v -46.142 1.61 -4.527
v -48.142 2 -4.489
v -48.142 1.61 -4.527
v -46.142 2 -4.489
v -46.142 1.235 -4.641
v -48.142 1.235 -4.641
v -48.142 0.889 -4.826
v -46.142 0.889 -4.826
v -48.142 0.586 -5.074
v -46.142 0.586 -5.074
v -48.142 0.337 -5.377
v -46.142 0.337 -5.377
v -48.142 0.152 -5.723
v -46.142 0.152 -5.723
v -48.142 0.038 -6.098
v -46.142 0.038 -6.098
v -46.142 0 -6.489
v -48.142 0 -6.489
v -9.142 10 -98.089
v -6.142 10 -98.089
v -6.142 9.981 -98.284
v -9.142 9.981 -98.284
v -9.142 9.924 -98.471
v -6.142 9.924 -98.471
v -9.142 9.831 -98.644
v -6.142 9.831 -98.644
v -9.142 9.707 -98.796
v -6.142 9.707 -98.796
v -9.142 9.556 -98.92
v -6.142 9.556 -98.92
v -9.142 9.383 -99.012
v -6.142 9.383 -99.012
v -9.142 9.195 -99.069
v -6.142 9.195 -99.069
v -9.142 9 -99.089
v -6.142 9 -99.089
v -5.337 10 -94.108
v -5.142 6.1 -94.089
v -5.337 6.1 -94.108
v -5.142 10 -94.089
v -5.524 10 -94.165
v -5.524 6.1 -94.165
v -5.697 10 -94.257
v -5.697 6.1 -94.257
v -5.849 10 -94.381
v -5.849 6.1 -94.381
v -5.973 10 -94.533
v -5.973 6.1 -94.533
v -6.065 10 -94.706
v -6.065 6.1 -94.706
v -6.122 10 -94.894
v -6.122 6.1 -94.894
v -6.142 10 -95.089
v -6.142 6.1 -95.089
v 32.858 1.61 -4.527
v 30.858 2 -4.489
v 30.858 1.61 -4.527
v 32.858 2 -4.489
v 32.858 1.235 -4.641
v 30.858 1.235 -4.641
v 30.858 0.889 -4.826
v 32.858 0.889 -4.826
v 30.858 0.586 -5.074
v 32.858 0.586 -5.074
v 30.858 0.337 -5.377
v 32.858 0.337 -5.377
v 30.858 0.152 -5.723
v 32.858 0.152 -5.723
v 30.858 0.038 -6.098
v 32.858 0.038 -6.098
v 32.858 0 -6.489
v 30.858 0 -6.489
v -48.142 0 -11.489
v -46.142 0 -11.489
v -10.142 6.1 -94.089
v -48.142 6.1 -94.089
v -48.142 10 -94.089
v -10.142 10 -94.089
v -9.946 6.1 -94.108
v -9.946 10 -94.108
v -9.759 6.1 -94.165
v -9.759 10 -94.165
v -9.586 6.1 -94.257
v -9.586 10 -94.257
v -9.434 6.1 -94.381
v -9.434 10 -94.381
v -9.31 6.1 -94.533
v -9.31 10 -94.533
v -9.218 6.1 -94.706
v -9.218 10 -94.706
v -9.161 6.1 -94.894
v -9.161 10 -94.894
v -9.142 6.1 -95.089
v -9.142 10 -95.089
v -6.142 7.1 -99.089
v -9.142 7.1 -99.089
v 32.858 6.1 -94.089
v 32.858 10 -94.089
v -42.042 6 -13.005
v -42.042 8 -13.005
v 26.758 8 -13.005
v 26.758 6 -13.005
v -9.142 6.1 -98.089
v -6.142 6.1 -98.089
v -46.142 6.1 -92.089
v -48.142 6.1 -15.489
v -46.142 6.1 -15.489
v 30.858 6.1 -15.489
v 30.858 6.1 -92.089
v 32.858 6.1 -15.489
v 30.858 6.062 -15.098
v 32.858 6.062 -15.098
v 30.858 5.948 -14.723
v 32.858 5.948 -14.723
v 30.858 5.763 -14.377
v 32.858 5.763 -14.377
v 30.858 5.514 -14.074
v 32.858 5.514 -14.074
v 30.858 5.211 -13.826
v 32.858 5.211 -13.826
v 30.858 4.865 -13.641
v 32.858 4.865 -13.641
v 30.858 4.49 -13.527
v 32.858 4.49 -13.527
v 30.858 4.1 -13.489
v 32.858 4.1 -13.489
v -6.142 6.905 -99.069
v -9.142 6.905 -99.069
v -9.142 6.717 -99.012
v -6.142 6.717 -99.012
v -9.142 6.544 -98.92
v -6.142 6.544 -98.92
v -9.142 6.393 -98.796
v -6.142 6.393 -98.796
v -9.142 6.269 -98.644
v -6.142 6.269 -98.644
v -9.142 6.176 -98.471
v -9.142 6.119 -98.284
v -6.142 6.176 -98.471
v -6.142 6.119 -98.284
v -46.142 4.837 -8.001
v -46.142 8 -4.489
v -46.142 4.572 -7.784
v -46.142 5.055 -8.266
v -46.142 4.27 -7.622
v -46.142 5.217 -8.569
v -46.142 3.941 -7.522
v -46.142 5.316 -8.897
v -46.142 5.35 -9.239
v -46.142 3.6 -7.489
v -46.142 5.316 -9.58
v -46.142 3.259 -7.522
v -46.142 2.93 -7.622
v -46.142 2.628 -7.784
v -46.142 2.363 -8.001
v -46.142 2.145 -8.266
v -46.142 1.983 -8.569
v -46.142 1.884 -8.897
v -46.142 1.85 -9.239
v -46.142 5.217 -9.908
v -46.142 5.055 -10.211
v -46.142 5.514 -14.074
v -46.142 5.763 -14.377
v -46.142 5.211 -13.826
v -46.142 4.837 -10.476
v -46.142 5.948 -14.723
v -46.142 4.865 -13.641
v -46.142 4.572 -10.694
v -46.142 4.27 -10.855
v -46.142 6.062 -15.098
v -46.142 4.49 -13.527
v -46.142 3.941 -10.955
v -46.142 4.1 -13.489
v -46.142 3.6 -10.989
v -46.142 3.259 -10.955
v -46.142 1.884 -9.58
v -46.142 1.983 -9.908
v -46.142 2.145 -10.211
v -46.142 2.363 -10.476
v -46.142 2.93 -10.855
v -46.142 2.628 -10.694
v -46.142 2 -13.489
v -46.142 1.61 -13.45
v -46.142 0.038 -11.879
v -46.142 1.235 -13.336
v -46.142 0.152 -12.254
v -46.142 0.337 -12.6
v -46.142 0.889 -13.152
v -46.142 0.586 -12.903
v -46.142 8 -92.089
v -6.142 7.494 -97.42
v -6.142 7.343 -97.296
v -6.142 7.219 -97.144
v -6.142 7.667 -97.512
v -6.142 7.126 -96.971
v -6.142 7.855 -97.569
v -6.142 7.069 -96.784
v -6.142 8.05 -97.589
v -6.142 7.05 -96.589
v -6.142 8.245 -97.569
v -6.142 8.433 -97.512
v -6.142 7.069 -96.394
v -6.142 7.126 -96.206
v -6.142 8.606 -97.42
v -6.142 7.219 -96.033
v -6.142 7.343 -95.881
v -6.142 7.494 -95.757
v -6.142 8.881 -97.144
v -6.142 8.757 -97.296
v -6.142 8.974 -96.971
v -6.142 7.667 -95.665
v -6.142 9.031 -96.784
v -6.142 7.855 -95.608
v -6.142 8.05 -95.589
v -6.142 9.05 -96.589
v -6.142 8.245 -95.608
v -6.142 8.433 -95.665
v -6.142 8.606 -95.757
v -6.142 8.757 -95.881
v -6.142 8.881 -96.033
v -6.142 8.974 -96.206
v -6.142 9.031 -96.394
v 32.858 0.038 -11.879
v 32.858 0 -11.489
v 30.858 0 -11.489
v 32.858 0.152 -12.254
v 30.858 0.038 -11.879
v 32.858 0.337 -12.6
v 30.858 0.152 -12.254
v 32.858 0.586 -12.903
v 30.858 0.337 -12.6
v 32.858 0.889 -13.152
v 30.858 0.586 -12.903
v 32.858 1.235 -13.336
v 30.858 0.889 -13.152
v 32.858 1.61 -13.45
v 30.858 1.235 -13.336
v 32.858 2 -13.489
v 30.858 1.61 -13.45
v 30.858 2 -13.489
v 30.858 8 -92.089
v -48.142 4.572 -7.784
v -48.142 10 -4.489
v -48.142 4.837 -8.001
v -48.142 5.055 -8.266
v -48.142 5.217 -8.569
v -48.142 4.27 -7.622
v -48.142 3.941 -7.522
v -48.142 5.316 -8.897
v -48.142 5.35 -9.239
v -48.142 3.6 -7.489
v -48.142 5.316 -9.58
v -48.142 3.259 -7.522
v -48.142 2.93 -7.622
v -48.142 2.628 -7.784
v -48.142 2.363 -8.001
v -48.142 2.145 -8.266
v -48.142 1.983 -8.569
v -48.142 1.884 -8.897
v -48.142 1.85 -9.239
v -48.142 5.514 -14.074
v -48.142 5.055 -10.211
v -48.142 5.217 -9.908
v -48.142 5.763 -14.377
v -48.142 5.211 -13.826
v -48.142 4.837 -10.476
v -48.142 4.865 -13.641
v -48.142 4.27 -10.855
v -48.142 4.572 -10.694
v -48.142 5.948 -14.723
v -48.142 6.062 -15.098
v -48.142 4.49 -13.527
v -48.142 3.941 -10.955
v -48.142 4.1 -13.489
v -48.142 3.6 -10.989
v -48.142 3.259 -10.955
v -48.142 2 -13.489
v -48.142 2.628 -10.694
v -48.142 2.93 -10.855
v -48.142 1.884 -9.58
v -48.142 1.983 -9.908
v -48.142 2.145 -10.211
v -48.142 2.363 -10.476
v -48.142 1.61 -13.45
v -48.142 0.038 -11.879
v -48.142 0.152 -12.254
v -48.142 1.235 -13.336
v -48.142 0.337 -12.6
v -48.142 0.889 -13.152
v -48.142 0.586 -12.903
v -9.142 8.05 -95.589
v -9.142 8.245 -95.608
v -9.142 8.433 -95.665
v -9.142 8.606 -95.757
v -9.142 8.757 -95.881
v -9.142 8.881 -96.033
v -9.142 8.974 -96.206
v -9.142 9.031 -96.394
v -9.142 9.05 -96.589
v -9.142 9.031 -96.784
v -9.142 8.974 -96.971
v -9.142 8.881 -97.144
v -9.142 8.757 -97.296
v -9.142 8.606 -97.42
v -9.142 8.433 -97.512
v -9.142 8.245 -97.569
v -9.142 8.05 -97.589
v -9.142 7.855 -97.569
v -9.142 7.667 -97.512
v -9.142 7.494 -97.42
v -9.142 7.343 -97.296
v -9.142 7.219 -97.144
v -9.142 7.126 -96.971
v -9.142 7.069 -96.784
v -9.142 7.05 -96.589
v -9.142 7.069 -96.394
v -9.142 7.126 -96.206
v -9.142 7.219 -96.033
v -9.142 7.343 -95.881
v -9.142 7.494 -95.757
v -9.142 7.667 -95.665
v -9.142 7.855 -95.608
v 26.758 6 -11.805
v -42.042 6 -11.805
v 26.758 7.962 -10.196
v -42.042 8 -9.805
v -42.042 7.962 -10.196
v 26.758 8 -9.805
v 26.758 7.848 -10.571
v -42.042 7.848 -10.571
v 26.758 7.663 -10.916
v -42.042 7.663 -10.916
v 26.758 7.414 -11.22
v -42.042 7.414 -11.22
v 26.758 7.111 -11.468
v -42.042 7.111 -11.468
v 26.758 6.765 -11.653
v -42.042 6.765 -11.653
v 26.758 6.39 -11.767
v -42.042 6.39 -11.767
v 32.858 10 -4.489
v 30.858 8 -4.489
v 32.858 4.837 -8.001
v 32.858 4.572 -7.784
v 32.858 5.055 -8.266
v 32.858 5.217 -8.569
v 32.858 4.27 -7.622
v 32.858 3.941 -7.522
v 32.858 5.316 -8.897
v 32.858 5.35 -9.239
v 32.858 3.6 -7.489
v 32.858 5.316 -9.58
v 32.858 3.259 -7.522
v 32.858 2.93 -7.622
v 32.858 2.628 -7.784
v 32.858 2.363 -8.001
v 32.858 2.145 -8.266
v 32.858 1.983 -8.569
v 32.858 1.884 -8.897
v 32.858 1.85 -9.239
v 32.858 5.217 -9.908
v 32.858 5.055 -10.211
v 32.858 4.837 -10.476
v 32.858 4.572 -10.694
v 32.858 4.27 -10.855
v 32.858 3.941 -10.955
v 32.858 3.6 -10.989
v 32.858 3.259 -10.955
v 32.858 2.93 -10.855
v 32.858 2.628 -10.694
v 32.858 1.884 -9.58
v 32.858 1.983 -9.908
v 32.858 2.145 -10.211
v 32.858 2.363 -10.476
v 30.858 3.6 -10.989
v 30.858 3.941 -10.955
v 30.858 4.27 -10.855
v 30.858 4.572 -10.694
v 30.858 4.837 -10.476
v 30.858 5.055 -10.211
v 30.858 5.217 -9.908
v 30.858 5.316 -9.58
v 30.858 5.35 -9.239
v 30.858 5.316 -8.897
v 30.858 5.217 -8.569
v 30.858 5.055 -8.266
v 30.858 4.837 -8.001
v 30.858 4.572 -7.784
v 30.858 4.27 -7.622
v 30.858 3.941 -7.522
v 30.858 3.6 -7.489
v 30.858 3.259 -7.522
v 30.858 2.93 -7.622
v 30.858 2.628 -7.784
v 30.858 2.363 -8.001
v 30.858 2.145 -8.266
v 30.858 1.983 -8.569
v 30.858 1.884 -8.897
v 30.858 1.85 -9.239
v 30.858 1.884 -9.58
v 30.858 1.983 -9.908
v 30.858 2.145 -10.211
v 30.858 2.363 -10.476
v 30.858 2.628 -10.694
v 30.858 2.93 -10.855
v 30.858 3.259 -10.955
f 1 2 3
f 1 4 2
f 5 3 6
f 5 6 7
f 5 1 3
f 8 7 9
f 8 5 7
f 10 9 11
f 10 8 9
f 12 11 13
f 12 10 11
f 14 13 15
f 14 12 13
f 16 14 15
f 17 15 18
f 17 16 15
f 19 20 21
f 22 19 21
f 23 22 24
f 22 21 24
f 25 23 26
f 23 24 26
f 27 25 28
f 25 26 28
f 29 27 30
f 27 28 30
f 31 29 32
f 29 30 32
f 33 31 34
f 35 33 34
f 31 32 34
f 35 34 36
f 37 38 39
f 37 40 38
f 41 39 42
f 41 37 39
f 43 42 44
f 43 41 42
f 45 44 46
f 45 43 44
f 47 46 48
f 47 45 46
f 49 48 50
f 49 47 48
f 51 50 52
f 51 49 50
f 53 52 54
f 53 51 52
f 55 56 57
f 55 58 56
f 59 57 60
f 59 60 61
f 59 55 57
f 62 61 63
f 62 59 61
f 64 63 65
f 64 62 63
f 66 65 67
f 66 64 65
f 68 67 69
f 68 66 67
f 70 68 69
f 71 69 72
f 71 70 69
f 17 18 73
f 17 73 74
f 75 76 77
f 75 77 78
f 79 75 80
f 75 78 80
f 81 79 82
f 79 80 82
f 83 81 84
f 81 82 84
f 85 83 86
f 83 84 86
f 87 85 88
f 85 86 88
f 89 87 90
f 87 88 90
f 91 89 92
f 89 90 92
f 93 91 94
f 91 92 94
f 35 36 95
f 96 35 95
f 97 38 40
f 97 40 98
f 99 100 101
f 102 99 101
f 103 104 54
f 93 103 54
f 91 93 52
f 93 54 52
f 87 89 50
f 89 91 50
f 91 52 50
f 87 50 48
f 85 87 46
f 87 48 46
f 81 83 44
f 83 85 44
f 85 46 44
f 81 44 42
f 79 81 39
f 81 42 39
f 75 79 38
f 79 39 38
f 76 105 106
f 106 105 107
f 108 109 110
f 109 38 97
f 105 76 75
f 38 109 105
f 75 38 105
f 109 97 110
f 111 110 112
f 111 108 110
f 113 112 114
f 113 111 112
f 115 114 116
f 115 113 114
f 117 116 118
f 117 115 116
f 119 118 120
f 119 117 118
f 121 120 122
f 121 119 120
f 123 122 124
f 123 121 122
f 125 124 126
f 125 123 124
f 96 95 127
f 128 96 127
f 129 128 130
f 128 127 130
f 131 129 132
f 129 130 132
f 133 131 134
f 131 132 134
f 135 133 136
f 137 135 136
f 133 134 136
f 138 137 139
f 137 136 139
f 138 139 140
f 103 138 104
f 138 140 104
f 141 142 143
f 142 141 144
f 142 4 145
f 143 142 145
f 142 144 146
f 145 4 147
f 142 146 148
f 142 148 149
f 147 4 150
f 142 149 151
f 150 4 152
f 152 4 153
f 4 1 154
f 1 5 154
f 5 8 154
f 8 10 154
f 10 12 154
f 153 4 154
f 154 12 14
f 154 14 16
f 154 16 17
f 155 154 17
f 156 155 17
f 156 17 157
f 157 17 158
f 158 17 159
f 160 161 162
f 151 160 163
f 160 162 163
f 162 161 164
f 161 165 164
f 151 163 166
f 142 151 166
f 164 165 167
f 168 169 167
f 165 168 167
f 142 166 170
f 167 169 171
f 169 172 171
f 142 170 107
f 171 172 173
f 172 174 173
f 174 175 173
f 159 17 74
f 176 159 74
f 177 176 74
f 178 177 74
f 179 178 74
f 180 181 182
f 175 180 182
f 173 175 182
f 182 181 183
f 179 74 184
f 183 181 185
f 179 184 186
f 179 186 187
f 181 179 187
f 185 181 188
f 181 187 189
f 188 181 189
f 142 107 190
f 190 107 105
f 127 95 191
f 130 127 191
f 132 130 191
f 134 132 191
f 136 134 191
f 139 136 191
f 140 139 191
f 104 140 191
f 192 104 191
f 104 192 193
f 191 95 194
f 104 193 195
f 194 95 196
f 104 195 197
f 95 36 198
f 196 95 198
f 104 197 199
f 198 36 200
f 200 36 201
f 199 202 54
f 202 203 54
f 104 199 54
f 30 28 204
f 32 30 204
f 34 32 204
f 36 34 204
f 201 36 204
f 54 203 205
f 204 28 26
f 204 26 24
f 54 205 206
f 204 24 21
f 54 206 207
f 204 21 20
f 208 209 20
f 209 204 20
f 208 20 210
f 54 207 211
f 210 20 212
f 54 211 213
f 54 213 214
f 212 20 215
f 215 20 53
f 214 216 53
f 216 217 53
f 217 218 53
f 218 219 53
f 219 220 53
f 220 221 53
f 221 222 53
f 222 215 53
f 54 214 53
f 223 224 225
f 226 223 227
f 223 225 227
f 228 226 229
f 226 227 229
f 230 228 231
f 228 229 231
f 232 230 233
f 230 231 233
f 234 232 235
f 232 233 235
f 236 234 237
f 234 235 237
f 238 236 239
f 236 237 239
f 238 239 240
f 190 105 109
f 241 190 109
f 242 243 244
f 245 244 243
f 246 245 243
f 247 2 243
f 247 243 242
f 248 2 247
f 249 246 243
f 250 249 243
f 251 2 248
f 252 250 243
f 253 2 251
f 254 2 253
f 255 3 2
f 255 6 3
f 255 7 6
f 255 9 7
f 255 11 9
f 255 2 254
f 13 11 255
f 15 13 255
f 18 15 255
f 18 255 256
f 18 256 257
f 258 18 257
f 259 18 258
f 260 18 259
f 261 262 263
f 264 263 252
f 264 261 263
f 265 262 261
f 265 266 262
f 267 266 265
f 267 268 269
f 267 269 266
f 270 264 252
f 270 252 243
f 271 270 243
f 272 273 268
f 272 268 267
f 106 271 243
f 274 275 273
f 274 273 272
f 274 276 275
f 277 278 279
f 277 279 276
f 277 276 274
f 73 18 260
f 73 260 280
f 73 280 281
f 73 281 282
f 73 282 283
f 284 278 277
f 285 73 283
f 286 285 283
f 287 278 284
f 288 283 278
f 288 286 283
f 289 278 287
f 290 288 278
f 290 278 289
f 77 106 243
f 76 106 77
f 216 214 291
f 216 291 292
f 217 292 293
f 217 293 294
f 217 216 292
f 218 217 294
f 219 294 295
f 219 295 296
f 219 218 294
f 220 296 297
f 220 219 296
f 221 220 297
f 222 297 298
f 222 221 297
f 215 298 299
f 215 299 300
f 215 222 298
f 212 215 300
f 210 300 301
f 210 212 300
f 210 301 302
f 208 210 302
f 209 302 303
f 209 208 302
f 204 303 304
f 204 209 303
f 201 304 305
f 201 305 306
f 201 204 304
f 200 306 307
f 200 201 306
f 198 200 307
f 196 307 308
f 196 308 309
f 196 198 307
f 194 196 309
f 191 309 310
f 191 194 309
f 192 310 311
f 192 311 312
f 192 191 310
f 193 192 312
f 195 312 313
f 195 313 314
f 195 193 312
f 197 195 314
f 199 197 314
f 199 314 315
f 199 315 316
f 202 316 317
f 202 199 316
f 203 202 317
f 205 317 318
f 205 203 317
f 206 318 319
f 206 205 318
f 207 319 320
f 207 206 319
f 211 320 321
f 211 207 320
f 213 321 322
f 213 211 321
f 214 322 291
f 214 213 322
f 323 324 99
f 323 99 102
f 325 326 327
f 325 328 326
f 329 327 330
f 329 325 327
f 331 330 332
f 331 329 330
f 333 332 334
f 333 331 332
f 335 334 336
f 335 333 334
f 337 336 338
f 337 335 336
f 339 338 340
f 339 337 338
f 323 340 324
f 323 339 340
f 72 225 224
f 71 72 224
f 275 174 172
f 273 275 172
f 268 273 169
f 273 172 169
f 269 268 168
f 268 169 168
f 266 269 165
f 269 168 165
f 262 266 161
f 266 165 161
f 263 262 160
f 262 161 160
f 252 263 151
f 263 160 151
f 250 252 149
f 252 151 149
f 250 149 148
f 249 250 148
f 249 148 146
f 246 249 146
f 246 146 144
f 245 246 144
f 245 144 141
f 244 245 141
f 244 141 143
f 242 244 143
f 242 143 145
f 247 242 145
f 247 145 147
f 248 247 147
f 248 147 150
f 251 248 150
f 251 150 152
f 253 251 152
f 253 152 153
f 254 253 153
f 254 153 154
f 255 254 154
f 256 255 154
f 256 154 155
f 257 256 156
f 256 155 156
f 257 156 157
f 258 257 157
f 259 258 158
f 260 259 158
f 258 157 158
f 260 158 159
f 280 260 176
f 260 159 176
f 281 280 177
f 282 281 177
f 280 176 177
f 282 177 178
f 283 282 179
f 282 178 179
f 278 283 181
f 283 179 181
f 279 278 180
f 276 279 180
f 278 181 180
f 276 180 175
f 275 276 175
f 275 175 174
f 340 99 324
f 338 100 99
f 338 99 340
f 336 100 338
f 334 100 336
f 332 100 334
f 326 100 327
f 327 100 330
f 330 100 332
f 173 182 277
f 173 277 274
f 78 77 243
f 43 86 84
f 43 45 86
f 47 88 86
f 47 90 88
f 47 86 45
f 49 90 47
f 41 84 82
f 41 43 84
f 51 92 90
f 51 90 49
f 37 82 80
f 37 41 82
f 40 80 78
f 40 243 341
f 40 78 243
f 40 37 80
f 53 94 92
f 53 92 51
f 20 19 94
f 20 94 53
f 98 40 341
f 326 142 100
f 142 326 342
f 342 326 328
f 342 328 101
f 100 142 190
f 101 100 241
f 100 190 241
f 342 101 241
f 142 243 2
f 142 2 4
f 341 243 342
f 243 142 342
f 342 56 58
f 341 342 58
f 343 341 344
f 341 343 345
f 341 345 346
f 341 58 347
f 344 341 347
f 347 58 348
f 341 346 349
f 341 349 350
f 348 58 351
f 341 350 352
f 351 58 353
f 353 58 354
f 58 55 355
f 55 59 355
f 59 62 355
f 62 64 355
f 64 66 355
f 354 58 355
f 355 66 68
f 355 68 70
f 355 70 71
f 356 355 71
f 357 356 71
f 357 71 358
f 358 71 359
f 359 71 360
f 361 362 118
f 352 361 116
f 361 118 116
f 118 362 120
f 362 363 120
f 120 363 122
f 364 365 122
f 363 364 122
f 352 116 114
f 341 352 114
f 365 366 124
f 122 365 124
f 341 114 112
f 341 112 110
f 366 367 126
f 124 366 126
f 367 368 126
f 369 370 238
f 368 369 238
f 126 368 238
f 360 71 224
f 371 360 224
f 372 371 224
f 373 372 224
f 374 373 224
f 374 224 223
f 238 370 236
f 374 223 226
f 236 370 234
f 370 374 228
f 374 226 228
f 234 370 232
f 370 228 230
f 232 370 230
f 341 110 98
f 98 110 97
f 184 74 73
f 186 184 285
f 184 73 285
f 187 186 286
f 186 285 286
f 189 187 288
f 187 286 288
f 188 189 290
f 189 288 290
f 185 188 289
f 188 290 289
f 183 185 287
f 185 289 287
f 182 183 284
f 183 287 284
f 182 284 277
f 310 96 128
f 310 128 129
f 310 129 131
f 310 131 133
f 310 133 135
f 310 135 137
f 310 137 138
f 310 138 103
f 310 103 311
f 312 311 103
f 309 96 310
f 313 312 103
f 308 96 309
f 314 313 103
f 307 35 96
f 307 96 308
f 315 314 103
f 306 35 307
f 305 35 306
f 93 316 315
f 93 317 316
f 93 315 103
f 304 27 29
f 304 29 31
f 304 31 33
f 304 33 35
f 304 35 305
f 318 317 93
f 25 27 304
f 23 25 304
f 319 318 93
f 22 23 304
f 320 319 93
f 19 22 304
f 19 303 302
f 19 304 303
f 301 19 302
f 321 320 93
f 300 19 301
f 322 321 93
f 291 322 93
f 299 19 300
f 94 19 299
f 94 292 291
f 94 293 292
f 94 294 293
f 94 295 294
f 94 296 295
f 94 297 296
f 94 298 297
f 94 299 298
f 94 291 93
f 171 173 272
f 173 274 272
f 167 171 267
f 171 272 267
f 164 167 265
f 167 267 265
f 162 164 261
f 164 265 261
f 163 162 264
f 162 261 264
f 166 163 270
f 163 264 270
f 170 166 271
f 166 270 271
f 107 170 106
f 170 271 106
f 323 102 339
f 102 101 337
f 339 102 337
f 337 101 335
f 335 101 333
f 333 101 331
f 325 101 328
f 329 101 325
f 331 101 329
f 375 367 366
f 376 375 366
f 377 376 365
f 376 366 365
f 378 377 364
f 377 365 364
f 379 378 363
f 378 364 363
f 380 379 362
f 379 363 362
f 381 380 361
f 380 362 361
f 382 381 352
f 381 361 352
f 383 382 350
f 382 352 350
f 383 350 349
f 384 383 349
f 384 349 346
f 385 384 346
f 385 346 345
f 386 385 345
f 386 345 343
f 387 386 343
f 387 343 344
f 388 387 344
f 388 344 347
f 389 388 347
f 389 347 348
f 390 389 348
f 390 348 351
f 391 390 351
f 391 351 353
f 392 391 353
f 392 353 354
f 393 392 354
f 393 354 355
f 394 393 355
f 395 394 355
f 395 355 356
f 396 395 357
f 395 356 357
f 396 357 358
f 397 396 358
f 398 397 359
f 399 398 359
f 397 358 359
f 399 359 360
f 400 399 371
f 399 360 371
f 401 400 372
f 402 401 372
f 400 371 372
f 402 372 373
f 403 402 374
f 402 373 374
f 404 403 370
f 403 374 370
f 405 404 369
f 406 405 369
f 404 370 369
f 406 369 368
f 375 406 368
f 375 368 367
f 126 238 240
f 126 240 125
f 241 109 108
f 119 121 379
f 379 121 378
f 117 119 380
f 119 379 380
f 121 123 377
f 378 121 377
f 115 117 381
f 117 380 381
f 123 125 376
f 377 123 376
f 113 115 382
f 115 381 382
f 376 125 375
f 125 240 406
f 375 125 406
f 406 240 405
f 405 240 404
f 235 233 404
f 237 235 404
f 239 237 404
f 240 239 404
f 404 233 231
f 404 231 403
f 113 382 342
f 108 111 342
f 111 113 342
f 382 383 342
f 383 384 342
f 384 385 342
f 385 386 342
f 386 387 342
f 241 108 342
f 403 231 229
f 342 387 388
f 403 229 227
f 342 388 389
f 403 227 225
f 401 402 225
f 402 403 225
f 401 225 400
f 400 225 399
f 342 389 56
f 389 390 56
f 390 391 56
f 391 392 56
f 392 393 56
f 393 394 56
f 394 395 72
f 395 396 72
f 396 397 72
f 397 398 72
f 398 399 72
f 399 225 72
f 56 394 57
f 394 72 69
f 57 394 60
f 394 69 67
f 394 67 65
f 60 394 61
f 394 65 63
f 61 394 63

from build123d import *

# Parameters (mm, degrees)
BOSS_EXTRUDE2_DEPTH      = 8
SKETCH2_W                = 81
SKETCH2_H                = 89.6
BOSS_EXTRUDE3_DEPTH      = 2
SKETCH3_R                = 1.75
CUT_EXTRUDE1_DEPTH       = 125.5538661
CUT_EXTRUDE2_DEPTH       = 124.262587838
CUT_EXTRUDE2_DEPTH_BACK  = 124.262587838
SKETCH4_W                = 80.6
SKETCH4_H                = 6.1
SKETCH5_W                = 68.8
SKETCH5_H                = 1.2
BOSS_EXTRUDE4_DEPTH      = 2
FILLET2_R                = 2
BOSS_EXTRUDE5_DEPTH      = 1.5
BOSS_EXTRUDE5_DEPTH_BACK = 1.5
SKETCH7_R                = 1
FILLET5_R                = 1


with BuildPart() as part:
    # Sketch1 → Boss-Extrude2 (new body)
    with BuildSketch(Plane(origin=(0, 0, 0), x_dir=(1, 0, 0), z_dir=(0, 1, 0))):
        Polygon((-46.14154214, 4.488604838), (-46.14154214, 13.488604838), (-46.14154214, 92.088604838), (30.85845786, 92.088604838), (30.85845786, 13.488604838), (30.85845786, 4.488604838), (32.85845786, 4.488604838), (32.85845786, 94.088604838), (-48.14154214, 94.088604838), (-48.14154214, 4.488604838), align=None)
    extrude(amount=BOSS_EXTRUDE2_DEPTH)

    # Sketch2 → Boss-Extrude3 (add)
    with BuildSketch(Plane(origin=(0, 8, 0), x_dir=(1, 0, 0), z_dir=(0, 1, 0))):
        with Locations((-7.64154214, 49.288604838)):
            Rectangle(SKETCH2_W, SKETCH2_H)
    extrude(amount=BOSS_EXTRUDE3_DEPTH)

    # Sketch3 → Cut-Extrude1 (cut, through all)
    with BuildSketch(Plane(origin=(32.85845786, 0, 0), x_dir=(0, 0, -1), z_dir=(1, 0, 0))):
        with Locations((9.238604838, 3.6)):
            Circle(SKETCH3_R)
    extrude(amount=-CUT_EXTRUDE1_DEPTH, mode=Mode.SUBTRACT)

    # Sketch4 → Cut-Extrude2 (cut, two sides: drawn at the far end of the back side and taken through both)
    with BuildSketch(Plane.ZY.offset(-30.85845786).offset(-CUT_EXTRUDE2_DEPTH_BACK)):
        with Locations((-53.788604838, 3.05)):
            Rectangle(SKETCH4_W, SKETCH4_H)
    extrude(amount=CUT_EXTRUDE2_DEPTH + CUT_EXTRUDE2_DEPTH_BACK, mode=Mode.SUBTRACT)

    # Sketch5 → Boss-Extrude4 (add)
    with BuildSketch(Plane.XZ.offset(-8)):
        with Locations((-7.64154214, -12.405302831)):
            Rectangle(SKETCH5_W, SKETCH5_H)
    extrude(amount=BOSS_EXTRUDE4_DEPTH)

    # Fillet2
    fillet2_edges = [part.edges().sort_by_distance(p)[0] for p in [
        (-7.64154214, 8, -11.805302831),
        (-47.14154214, 0, -4.488604838),
        (-47.14154214, 0, -13.488604838),
        (-47.14154214, 6.1, -13.488604838),
        (31.85845786, 6.1, -13.488604838),
        (31.85845786, 0, -4.488604838),
        (31.85845786, 0, -13.488604838),
    ]]
    fillet(fillet2_edges, radius=FILLET2_R - 0.0001)  # a hair under: the kernel refuses the full size

    # Sketch7 → Boss-Extrude5 (add, two sides: drawn at the far end of the back side and taken through both)
    with BuildSketch(Plane.ZY.offset(7.64154214).offset(-BOSS_EXTRUDE5_DEPTH_BACK)):
        with BuildLine():
            Line((-94.088604838, 10), (-98.088604838, 10))
            ThreePointArc((-98.088604838, 10), (-98.79571162, 9.707106781), (-99.088604838, 9))
            Line((-99.088604838, 9), (-99.088604838, 7.1))
            ThreePointArc((-99.088604838, 7.1), (-98.79571162, 6.392893219), (-98.088604838, 6.1))
            Line((-98.088604838, 6.1), (-94.088604838, 6.1))
            Line((-94.088604838, 6.1), (-94.088604838, 10))
        make_face()
        with Locations((-96.588604838, 8.05)):
            Circle(SKETCH7_R, mode=Mode.SUBTRACT)
    extrude(amount=BOSS_EXTRUDE5_DEPTH + BOSS_EXTRUDE5_DEPTH_BACK)

    # Fillet5
    fillet5_edges = [part.edges().sort_by_distance(p)[0] for p in [
        (-6.14154214, 8.05, -94.088604838),
        (-9.14154214, 8.05, -94.088604838),
    ]]
    fillet(fillet5_edges, radius=FILLET5_R)


solid = part.part
